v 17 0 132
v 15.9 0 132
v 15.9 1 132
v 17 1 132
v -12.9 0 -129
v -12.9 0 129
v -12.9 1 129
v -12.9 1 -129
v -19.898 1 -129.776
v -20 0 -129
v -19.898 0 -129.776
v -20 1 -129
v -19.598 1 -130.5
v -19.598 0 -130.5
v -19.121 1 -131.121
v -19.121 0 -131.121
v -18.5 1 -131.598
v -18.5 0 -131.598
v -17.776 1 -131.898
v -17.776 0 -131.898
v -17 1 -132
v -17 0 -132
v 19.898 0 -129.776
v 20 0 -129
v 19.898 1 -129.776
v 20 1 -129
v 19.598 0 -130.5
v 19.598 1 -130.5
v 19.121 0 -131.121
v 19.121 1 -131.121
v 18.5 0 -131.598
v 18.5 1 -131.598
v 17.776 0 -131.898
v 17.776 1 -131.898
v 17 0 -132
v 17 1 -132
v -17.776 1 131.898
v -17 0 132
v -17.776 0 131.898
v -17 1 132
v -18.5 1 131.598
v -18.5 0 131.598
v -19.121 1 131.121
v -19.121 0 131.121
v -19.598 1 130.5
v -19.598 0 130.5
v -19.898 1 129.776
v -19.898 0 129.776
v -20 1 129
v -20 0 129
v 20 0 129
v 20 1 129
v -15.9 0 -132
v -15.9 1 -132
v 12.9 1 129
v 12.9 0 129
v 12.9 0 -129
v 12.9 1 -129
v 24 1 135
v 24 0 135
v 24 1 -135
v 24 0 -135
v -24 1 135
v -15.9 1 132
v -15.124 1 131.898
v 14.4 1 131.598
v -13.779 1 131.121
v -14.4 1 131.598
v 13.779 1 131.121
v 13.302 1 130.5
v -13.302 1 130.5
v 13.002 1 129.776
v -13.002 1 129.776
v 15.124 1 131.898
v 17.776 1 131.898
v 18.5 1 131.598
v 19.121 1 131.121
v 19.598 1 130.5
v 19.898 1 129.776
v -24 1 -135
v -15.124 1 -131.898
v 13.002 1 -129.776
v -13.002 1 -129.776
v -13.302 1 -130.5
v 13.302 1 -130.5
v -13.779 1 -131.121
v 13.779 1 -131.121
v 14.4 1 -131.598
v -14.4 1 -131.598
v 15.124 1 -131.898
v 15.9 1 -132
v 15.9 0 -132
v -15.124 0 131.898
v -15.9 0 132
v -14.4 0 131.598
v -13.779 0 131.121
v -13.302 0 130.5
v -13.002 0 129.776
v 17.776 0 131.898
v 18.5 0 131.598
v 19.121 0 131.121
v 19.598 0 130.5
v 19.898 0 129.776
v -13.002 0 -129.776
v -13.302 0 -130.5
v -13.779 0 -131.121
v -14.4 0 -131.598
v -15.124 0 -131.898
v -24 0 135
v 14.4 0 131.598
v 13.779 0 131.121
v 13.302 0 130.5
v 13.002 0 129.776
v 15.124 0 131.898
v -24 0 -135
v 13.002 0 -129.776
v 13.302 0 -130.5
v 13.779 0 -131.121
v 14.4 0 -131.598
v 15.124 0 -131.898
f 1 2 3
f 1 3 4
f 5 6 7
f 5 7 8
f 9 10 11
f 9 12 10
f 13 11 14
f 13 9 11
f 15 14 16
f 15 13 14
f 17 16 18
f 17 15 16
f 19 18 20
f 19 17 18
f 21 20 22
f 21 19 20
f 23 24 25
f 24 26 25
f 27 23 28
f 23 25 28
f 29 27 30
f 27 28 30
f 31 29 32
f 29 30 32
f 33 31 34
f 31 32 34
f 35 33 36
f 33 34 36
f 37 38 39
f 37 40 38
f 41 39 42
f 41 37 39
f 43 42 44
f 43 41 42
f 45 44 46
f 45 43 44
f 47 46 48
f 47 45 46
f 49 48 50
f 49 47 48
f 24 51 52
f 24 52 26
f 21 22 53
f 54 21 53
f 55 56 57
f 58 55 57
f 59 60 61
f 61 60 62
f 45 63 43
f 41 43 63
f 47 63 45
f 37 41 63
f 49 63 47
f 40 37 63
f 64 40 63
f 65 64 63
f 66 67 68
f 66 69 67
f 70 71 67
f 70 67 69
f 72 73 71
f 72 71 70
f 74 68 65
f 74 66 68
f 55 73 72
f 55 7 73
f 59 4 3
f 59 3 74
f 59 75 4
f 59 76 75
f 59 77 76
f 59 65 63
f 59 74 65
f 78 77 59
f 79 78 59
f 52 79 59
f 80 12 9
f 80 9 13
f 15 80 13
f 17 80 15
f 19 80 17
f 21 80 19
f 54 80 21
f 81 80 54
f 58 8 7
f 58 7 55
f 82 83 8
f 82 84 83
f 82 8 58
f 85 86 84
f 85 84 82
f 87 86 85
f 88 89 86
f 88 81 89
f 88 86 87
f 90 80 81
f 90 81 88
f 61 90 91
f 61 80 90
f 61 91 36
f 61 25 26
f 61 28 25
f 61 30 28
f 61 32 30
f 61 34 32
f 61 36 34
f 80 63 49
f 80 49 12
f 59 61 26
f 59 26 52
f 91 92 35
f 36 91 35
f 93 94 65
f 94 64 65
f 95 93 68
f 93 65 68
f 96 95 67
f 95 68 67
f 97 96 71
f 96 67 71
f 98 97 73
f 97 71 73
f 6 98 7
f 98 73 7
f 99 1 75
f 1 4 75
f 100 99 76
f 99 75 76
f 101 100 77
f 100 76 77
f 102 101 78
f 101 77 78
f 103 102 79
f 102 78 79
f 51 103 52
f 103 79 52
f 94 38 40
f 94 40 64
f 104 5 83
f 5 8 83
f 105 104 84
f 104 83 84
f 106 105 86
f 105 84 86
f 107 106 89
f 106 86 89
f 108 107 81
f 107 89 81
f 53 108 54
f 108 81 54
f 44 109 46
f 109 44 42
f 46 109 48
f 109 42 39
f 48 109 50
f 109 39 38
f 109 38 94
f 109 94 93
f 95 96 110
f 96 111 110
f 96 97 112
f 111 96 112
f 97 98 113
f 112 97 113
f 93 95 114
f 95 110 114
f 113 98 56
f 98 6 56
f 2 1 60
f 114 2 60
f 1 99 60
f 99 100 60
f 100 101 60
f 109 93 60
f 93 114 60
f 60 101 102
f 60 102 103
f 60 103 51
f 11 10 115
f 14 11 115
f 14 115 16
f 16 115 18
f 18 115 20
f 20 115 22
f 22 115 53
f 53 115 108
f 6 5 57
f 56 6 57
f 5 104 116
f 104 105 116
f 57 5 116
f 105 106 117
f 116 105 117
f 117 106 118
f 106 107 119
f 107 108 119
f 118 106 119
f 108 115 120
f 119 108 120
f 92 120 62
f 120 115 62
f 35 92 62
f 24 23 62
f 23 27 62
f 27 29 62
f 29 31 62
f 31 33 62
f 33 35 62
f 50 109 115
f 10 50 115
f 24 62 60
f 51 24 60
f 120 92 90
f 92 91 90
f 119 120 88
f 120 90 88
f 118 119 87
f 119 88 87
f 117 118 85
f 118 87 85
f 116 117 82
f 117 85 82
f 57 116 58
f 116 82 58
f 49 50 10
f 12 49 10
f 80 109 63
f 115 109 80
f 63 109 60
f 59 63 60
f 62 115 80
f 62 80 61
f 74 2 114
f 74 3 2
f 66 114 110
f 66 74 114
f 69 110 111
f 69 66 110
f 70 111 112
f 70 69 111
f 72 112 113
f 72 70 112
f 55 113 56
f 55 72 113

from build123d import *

# Parameters (mm, degrees)
SKETCH1_W           = 48
SKETCH1_H           = 270
SKETCH1_W_2         = 7.1
SKETCH1_H_2         = 264
BOSS_EXTRUDE1_DEPTH = 1
FILLET1_R           = 3


with BuildPart() as part:
    # Sketch1 → Boss-Extrude1 (new body)
    with BuildSketch(Plane(origin=(0, 0, 0), x_dir=(1, 0, 0), z_dir=(0, 1, 0))):
        Rectangle(SKETCH1_W, SKETCH1_H)
        with Locations((-16.45, 0)):
            Rectangle(SKETCH1_W_2, SKETCH1_H_2, mode=Mode.SUBTRACT)
        with Locations((16.45, 0)):
            Rectangle(SKETCH1_W_2, SKETCH1_H_2, mode=Mode.SUBTRACT)
    extrude(amount=BOSS_EXTRUDE1_DEPTH)

    # Fillet1
    fillet1_edges = [part.edges().sort_by_distance(p)[0] for p in [
        (-20, 0.5, -132),
        (-20, 0.5, 132),
        (-12.9, 0.5, 132),
        (-12.9, 0.5, -132),
        (20, 0.5, 132),
        (20, 0.5, -132),
        (12.9, 0.5, -132),
        (12.9, 0.5, 132),
    ]]
    fillet(fillet1_edges, radius=FILLET1_R)


solid = part.part
